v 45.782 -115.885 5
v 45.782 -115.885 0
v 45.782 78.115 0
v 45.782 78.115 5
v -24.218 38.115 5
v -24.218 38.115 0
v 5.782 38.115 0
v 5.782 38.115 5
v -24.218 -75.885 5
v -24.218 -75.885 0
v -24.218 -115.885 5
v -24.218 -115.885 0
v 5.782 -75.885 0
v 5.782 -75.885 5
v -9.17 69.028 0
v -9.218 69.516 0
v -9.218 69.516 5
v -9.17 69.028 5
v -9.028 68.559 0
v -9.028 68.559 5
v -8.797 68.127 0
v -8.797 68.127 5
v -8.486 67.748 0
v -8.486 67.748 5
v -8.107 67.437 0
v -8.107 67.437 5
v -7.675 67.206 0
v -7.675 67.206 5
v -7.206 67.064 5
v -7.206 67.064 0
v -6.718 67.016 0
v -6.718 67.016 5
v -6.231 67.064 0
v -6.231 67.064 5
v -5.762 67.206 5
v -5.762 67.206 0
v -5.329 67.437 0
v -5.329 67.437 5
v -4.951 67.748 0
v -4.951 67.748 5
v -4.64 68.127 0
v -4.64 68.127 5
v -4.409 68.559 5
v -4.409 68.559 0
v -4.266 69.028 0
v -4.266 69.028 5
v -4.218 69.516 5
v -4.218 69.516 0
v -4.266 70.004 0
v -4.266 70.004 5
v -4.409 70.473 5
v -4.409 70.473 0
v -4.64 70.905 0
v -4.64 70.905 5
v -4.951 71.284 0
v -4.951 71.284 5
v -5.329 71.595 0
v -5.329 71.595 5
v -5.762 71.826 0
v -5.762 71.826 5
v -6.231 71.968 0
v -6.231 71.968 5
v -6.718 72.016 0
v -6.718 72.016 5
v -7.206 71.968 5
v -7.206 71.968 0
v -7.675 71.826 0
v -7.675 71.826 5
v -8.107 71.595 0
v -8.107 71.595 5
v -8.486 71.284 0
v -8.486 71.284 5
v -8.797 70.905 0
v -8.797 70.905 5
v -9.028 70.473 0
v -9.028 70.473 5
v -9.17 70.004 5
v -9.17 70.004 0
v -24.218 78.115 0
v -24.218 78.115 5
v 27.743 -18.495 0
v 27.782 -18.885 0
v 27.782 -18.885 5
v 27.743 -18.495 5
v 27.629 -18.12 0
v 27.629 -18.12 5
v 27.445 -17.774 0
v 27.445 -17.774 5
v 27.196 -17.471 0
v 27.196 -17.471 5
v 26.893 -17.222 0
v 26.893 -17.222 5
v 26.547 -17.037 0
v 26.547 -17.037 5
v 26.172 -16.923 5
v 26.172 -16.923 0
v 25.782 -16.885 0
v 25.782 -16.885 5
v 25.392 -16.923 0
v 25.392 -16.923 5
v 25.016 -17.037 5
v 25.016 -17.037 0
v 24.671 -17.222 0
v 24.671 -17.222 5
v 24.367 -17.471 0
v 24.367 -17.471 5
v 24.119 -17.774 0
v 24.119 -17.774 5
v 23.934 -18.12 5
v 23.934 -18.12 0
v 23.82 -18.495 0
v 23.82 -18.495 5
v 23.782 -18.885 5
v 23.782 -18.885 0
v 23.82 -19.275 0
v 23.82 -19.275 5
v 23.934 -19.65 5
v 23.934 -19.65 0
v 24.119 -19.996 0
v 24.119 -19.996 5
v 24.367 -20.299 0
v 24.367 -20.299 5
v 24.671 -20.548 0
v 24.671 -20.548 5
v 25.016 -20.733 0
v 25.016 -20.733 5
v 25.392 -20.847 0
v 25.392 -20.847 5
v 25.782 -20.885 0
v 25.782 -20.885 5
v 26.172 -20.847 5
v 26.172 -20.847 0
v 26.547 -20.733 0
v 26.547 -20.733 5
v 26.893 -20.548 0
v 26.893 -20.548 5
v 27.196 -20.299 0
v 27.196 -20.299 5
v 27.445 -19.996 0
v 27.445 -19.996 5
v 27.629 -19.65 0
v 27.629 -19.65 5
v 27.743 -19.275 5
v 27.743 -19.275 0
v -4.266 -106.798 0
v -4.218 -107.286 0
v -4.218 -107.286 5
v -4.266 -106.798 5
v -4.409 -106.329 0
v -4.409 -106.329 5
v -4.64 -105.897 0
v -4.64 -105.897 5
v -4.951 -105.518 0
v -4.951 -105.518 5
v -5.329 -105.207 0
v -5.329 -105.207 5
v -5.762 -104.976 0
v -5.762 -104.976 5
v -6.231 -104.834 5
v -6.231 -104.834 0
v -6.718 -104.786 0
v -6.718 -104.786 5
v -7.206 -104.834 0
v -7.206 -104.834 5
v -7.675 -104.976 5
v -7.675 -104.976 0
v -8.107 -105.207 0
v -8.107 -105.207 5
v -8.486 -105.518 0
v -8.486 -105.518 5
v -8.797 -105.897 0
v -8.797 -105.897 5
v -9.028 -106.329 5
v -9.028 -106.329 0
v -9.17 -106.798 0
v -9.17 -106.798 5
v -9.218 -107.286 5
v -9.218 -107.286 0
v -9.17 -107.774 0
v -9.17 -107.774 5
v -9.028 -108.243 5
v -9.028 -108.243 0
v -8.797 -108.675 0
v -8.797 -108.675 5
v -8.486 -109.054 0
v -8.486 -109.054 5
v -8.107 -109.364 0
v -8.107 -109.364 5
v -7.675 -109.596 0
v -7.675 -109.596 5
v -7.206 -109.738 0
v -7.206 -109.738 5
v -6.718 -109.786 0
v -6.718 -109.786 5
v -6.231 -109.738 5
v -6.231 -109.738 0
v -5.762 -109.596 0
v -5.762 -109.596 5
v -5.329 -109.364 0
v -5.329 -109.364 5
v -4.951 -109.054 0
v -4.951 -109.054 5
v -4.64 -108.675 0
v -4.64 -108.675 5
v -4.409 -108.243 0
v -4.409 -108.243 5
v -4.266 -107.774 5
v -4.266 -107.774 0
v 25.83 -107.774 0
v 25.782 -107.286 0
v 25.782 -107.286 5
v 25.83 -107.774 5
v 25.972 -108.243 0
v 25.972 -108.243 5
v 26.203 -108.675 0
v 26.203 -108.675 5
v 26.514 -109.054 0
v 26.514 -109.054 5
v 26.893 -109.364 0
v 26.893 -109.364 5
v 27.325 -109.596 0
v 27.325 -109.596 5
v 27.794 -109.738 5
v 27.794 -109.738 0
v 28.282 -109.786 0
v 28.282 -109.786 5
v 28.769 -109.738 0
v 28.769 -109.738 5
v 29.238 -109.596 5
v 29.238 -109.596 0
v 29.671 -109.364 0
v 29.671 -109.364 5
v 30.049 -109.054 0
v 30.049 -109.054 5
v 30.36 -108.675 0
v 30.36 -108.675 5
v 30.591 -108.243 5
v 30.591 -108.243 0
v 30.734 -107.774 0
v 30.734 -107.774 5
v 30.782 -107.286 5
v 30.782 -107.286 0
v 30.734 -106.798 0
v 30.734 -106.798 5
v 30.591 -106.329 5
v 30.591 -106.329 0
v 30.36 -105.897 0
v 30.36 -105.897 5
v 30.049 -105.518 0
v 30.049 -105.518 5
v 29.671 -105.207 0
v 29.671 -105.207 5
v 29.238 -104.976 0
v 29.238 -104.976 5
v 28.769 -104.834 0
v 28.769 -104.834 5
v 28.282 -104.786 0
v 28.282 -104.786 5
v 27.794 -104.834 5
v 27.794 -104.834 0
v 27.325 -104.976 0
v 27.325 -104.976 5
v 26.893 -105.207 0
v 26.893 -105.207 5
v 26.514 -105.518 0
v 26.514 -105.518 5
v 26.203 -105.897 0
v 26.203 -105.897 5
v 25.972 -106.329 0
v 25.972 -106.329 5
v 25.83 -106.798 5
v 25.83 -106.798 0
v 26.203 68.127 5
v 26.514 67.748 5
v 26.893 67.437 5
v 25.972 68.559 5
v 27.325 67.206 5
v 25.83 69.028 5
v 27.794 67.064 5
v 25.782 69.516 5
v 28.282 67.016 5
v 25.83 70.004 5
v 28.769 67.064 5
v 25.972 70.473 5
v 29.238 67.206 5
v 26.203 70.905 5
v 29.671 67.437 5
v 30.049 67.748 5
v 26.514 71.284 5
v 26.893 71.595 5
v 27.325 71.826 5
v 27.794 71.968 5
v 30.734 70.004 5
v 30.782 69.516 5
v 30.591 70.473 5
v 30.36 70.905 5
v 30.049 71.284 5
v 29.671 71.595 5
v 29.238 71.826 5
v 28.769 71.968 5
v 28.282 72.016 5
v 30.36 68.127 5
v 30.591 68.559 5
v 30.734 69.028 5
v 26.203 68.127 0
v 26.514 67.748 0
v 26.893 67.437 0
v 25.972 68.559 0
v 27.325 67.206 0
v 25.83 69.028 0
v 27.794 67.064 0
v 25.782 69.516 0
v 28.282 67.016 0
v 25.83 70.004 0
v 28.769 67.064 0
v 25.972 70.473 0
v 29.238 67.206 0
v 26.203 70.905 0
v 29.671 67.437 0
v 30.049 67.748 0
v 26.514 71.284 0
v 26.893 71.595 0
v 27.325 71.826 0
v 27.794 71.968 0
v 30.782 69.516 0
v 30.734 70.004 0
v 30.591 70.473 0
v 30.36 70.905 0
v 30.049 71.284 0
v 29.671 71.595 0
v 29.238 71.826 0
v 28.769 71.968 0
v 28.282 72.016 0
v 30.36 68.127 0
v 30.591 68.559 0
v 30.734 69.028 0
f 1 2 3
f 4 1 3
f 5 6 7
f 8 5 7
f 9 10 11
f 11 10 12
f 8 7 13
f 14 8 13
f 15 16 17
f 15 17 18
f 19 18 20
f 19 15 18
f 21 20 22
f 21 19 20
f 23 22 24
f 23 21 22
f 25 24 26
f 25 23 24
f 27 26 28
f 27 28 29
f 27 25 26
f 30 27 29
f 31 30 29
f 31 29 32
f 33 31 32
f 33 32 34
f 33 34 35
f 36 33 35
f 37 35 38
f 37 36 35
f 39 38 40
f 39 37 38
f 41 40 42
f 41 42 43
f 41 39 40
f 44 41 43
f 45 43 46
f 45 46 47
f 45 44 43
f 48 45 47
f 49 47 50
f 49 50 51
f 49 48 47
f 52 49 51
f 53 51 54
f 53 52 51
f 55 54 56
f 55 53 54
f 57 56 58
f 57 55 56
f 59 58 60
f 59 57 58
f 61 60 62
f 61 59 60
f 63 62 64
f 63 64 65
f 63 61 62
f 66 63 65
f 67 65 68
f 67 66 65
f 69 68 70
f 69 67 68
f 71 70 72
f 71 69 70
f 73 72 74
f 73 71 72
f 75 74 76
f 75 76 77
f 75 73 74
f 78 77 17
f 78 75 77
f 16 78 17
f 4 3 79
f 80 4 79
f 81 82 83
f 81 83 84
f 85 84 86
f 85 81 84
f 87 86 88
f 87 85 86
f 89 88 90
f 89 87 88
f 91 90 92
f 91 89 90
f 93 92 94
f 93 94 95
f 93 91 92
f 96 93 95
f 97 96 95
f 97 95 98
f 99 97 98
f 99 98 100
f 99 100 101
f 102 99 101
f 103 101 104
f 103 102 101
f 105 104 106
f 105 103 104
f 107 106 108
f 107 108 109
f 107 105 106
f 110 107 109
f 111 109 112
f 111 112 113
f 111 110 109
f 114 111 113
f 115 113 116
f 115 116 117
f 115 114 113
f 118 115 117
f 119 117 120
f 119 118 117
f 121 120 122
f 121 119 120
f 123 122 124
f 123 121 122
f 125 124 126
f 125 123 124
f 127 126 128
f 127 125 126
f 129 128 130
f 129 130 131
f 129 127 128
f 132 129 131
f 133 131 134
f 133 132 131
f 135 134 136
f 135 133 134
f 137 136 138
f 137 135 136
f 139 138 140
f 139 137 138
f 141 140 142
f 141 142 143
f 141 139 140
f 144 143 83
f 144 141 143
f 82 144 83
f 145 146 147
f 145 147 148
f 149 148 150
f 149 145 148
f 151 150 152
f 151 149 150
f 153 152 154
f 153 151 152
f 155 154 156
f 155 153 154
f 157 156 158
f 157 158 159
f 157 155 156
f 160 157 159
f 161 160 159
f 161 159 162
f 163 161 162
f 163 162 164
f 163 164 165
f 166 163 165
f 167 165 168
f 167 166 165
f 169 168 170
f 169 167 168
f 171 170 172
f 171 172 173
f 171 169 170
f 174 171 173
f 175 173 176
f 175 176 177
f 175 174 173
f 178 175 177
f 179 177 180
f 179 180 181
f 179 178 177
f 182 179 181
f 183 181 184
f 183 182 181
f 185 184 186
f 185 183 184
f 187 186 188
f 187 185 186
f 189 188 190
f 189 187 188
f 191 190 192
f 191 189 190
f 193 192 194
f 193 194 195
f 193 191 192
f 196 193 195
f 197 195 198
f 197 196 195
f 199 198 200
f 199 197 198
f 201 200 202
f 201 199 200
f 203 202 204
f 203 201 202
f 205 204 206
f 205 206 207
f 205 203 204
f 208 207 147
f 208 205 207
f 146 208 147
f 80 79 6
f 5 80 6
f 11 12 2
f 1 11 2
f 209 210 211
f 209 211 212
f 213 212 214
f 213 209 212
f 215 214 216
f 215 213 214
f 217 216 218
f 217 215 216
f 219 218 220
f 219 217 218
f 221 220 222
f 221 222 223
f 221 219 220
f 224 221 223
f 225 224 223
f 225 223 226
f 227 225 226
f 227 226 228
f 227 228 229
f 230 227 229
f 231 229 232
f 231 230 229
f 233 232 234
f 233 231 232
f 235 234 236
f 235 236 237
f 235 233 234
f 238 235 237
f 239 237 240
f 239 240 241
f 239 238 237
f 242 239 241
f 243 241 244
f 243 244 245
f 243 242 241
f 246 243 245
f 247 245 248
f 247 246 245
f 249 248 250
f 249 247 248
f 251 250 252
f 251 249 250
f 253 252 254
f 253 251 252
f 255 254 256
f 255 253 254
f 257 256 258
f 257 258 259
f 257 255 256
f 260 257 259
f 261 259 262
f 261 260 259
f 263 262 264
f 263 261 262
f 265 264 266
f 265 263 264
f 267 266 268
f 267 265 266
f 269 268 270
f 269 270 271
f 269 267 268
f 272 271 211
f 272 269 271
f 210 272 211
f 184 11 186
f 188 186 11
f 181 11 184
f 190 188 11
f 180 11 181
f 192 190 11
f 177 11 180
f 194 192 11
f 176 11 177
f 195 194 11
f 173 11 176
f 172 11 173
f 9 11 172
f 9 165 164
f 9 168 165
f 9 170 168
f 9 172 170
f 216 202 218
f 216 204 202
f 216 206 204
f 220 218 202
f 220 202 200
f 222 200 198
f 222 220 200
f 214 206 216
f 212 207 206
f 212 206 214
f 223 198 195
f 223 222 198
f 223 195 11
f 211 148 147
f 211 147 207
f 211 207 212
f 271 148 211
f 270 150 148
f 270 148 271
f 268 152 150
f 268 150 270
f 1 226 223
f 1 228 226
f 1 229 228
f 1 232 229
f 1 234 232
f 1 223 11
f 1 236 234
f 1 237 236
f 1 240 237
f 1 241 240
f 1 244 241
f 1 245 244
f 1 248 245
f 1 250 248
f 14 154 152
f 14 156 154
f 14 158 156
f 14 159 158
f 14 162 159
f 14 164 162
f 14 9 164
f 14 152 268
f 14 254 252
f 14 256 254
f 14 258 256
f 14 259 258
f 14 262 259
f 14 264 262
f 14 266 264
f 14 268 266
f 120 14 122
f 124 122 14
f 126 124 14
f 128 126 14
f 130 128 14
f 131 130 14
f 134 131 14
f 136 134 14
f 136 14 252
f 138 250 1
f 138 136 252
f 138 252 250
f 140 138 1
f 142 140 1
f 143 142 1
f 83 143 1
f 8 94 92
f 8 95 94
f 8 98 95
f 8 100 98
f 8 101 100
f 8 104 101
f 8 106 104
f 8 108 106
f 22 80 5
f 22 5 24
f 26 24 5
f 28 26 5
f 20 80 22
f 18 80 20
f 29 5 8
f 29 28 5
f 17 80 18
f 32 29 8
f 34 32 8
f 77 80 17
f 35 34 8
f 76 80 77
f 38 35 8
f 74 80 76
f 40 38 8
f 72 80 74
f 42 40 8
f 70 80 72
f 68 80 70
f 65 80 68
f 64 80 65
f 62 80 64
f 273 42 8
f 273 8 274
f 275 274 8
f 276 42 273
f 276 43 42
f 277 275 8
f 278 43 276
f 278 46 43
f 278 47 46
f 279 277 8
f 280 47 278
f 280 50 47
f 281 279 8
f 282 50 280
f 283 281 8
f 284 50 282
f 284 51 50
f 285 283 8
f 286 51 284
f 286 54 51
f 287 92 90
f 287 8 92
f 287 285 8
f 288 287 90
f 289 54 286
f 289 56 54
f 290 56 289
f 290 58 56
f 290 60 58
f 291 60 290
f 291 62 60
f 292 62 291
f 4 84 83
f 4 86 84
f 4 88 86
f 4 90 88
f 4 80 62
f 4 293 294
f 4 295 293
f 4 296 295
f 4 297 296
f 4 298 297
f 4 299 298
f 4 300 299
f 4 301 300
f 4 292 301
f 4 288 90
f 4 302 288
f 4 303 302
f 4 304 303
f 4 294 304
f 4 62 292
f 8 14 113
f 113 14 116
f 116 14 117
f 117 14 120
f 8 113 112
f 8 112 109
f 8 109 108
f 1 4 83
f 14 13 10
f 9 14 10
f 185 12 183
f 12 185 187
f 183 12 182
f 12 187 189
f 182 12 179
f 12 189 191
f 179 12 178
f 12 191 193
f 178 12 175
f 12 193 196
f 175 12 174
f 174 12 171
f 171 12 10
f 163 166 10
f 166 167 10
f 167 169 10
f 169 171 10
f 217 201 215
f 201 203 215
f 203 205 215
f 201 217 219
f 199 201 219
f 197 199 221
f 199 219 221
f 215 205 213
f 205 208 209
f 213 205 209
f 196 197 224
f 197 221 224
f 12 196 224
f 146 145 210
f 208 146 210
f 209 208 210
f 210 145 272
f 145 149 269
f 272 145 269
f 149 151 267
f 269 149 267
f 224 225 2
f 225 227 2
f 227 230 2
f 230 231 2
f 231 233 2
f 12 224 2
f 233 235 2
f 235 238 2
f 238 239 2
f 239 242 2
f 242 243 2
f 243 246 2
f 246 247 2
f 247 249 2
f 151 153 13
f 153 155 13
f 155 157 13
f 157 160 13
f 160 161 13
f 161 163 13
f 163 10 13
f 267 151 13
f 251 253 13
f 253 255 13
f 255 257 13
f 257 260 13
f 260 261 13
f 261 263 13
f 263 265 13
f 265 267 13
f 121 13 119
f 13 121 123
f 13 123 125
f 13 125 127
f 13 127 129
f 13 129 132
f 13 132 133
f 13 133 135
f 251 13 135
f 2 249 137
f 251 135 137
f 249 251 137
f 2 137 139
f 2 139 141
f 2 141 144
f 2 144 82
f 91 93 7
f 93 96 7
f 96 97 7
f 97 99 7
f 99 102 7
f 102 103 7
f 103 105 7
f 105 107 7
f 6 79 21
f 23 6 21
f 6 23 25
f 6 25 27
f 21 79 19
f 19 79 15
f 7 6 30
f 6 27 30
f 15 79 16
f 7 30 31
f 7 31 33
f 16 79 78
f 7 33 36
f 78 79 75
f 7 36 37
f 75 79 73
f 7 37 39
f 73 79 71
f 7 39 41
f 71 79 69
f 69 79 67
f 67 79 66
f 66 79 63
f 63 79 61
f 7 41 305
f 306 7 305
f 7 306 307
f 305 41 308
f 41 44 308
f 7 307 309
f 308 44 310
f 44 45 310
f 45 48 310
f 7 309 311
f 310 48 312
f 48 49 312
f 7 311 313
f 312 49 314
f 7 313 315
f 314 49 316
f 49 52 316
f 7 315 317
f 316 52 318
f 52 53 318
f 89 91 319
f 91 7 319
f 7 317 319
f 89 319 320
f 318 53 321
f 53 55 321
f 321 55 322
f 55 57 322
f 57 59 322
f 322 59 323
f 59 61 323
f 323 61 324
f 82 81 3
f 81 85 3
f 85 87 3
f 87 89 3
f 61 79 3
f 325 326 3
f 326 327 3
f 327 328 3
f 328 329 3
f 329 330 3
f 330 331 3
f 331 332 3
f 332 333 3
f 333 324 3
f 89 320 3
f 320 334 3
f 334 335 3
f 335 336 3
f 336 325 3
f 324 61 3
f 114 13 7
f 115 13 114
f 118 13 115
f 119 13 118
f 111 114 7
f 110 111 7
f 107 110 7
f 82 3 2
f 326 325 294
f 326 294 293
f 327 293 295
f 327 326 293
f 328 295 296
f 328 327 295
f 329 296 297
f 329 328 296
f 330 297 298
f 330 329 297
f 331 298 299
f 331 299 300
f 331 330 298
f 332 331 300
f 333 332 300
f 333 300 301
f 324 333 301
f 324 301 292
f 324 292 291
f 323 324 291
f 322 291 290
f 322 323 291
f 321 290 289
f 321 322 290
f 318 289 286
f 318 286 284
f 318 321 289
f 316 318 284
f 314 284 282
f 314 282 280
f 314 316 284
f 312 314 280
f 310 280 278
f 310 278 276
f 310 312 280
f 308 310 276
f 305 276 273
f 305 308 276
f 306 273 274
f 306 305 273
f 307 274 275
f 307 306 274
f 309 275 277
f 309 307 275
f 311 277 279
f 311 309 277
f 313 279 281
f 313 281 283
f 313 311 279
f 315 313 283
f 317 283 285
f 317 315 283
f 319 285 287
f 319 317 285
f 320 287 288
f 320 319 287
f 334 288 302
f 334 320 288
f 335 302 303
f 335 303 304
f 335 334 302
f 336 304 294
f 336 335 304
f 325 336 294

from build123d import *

# Parameters (mm, degrees)
SKETCH1_R           = 2
SKETCH1_R_2         = 2.5
BOSS_EXTRUDE1_DEPTH = 5


with BuildPart() as part:
    # Sketch1 → Boss-Extrude1 (new body)
    with BuildSketch(Plane.XY):
        Polygon((-24.218289086, 78.115044248), (-24.218289086, 38.115044248), (5.781710914, 38.115044248), (5.781710914, -75.884955752), (-24.218289086, -75.884955752), (-24.218289086, -115.884955752), (45.781710914, -115.884955752), (45.781710914, 78.115044248), align=None)
        with Locations((25.781710914, -18.884955752)):
            Circle(SKETCH1_R, mode=Mode.SUBTRACT)
        with Locations((-6.718289086, -107.285805209)):
            Circle(SKETCH1_R_2, mode=Mode.SUBTRACT)
        with Locations(Location((28.281710914, -107.285805209, 0), (0, 0, 180))):
            Circle(SKETCH1_R_2, mode=Mode.SUBTRACT)
        with Locations((28.281710914, 69.515893704)):
            Circle(SKETCH1_R_2, mode=Mode.SUBTRACT)
        with Locations(Location((-6.718289086, 69.515893704, 0), (0, 0, 180))):
            Circle(SKETCH1_R_2, mode=Mode.SUBTRACT)
    extrude(amount=BOSS_EXTRUDE1_DEPTH)


solid = part.part
